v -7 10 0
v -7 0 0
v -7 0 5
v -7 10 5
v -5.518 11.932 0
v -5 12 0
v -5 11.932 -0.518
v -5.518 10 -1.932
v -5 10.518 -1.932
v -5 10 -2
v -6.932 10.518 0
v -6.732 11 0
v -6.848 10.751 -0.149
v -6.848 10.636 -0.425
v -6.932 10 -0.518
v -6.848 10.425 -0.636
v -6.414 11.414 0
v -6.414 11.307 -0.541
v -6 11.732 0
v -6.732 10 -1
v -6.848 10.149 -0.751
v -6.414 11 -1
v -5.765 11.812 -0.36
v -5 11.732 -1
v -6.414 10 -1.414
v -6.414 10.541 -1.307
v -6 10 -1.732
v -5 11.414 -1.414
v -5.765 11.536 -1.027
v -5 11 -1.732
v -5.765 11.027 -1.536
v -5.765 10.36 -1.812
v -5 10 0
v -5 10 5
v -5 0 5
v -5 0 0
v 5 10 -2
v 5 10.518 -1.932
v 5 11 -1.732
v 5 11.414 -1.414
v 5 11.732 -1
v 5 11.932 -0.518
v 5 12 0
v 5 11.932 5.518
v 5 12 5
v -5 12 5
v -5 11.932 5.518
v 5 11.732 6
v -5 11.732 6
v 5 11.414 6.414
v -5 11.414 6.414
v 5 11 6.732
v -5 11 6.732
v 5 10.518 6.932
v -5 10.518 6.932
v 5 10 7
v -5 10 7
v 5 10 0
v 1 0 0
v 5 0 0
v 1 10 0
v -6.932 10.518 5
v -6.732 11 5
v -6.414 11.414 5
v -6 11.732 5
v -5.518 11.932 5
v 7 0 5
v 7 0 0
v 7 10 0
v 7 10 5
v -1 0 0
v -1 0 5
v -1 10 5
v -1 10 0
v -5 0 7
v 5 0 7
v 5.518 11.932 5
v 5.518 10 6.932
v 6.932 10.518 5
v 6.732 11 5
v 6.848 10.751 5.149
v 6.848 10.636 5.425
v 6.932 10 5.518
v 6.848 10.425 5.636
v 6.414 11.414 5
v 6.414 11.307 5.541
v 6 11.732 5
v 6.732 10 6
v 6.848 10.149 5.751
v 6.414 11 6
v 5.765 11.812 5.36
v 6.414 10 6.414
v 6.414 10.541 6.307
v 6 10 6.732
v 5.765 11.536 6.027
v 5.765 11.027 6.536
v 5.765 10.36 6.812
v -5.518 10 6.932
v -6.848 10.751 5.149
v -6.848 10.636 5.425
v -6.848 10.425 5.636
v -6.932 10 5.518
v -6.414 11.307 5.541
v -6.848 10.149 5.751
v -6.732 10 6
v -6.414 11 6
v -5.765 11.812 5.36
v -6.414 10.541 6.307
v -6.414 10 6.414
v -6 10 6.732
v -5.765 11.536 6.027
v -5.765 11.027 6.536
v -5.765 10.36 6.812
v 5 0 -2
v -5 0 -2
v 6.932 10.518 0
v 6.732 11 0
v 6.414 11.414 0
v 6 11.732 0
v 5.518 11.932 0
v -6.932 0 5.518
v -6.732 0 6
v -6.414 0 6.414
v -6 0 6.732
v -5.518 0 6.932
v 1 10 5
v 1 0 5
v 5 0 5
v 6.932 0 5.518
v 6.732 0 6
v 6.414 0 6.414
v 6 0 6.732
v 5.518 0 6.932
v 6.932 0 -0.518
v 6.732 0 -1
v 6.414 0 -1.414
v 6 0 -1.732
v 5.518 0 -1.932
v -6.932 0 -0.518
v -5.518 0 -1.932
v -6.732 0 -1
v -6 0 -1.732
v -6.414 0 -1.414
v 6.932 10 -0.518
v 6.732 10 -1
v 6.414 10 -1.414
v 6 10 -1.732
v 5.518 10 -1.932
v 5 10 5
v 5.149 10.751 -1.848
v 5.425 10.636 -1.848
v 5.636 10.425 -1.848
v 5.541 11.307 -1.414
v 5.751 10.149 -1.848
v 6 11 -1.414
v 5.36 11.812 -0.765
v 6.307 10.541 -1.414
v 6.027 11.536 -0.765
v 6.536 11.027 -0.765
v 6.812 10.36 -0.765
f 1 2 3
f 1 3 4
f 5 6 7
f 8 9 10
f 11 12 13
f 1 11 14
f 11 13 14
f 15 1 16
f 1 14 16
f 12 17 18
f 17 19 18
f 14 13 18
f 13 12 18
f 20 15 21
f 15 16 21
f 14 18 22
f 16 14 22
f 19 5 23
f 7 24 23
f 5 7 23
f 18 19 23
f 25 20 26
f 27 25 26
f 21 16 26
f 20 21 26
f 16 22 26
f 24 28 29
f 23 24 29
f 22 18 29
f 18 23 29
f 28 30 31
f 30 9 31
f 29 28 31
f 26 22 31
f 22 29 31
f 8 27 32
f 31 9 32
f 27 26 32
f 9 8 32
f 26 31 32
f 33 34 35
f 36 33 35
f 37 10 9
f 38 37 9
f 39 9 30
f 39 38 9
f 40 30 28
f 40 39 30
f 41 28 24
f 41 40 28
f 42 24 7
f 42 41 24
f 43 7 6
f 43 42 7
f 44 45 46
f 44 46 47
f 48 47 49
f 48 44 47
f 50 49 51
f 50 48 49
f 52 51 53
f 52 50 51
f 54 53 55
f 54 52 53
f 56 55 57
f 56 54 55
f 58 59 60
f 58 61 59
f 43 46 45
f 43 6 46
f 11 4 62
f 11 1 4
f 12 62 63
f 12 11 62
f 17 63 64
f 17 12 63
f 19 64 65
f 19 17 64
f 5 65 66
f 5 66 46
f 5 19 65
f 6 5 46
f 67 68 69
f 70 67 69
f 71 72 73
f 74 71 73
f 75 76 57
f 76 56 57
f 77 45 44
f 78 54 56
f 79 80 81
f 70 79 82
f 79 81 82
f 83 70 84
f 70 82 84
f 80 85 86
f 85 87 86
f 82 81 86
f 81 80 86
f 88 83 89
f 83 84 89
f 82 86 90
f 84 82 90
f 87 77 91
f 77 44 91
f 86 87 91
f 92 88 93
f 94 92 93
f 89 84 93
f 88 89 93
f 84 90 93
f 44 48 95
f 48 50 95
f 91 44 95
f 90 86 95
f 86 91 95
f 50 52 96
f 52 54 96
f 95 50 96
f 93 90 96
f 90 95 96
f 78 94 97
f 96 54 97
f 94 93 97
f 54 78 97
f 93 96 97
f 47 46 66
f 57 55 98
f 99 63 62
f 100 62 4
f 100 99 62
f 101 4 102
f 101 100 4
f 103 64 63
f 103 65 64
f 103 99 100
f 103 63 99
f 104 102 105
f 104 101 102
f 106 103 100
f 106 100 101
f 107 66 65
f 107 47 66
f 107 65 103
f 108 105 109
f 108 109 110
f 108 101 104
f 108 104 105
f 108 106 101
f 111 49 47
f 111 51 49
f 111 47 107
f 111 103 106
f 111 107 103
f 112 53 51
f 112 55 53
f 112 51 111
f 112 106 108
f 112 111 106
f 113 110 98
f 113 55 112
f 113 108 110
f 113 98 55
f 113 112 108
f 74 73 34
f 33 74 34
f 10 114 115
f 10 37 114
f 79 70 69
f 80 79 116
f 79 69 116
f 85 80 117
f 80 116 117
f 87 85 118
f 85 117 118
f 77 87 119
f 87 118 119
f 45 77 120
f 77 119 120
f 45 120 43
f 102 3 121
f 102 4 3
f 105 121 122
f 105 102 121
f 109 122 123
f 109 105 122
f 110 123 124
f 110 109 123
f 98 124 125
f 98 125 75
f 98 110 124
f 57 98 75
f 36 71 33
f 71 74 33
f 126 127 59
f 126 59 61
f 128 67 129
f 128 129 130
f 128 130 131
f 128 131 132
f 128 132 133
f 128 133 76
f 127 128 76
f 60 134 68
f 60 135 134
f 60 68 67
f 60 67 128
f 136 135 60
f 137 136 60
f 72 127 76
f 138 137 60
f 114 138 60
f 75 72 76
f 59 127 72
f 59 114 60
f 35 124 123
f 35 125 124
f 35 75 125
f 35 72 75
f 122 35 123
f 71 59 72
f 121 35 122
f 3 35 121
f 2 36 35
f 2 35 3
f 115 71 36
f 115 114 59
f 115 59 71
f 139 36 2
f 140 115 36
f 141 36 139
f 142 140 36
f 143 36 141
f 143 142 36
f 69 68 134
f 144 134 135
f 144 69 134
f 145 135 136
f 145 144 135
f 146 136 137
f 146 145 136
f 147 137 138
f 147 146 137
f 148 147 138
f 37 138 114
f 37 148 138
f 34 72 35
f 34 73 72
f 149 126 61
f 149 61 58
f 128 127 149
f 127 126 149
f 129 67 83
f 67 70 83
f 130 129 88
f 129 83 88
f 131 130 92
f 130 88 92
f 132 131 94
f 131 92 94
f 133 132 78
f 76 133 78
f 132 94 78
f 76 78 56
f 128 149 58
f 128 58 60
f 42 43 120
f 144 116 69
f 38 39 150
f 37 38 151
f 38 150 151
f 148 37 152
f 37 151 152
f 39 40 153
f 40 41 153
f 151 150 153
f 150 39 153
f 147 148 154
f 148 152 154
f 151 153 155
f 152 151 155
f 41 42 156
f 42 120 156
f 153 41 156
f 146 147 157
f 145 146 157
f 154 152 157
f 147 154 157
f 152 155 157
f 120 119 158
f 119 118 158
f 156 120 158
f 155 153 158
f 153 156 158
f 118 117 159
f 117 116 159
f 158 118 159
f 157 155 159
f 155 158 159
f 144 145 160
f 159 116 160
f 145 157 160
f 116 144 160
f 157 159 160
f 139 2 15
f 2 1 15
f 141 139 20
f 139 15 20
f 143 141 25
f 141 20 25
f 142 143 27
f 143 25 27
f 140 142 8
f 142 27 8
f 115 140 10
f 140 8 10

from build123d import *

# Parameters (mm, degrees)
F1_DEPTH = 2.5
F0_W     = 4
F0_H     = 10
F2_DEPTH = 2
F5_R     = 2


with BuildPart() as f1:
    # F0 (on Top) → F1 (new body)
    with BuildSketch(Plane.XY):
        Polygon((0, 12), (0, 0), (1, 0), (1, 10), (5, 10), (5, 0), (7, 0), (7, 12), align=None)
    extrude(amount=F1_DEPTH)

    # F0 (on Top) → F2 (join)
    with BuildSketch(Plane.XY):
        with Locations((3, 5)):
            Rectangle(F0_W, F0_H)
        Polygon((0, 12), (0, 0), (1, 0), (1, 10), (5, 10), (5, 0), (7, 0), (7, 12), align=None)
    extrude(amount=-F2_DEPTH)

    # F3: F1 across face


with BuildPart() as f1_1:
    add(f1.part)
    add(f1.part.mirror(Plane(origin=(0, 6, 0.25), x_dir=(0, -1, 0), z_dir=(-1, 0, 0))))

    # F4: F1 across face


with BuildPart() as f1_2:
    add(f1_1.part)
    add(f1_1.part.mirror(Plane(origin=(0, 6.9090909091, 2.5), x_dir=(1, 0, 0), z_dir=(0, 0, 1))))

    # F5
    f5_edges = [f1_2.edges().sort_by_distance(p)[0] for p in [
        (0, 12, 7),
        (7, 12, 2.5),
        (0, 12, -2),
        (-7, 12, 2.5),
        (7, 6, 7),
        (-7, 6, 7),
        (7, 6, -2),
        (-7, 6, -2),
    ]]
    fillet(f5_edges, radius=F5_R)


solid = f1_2.part
